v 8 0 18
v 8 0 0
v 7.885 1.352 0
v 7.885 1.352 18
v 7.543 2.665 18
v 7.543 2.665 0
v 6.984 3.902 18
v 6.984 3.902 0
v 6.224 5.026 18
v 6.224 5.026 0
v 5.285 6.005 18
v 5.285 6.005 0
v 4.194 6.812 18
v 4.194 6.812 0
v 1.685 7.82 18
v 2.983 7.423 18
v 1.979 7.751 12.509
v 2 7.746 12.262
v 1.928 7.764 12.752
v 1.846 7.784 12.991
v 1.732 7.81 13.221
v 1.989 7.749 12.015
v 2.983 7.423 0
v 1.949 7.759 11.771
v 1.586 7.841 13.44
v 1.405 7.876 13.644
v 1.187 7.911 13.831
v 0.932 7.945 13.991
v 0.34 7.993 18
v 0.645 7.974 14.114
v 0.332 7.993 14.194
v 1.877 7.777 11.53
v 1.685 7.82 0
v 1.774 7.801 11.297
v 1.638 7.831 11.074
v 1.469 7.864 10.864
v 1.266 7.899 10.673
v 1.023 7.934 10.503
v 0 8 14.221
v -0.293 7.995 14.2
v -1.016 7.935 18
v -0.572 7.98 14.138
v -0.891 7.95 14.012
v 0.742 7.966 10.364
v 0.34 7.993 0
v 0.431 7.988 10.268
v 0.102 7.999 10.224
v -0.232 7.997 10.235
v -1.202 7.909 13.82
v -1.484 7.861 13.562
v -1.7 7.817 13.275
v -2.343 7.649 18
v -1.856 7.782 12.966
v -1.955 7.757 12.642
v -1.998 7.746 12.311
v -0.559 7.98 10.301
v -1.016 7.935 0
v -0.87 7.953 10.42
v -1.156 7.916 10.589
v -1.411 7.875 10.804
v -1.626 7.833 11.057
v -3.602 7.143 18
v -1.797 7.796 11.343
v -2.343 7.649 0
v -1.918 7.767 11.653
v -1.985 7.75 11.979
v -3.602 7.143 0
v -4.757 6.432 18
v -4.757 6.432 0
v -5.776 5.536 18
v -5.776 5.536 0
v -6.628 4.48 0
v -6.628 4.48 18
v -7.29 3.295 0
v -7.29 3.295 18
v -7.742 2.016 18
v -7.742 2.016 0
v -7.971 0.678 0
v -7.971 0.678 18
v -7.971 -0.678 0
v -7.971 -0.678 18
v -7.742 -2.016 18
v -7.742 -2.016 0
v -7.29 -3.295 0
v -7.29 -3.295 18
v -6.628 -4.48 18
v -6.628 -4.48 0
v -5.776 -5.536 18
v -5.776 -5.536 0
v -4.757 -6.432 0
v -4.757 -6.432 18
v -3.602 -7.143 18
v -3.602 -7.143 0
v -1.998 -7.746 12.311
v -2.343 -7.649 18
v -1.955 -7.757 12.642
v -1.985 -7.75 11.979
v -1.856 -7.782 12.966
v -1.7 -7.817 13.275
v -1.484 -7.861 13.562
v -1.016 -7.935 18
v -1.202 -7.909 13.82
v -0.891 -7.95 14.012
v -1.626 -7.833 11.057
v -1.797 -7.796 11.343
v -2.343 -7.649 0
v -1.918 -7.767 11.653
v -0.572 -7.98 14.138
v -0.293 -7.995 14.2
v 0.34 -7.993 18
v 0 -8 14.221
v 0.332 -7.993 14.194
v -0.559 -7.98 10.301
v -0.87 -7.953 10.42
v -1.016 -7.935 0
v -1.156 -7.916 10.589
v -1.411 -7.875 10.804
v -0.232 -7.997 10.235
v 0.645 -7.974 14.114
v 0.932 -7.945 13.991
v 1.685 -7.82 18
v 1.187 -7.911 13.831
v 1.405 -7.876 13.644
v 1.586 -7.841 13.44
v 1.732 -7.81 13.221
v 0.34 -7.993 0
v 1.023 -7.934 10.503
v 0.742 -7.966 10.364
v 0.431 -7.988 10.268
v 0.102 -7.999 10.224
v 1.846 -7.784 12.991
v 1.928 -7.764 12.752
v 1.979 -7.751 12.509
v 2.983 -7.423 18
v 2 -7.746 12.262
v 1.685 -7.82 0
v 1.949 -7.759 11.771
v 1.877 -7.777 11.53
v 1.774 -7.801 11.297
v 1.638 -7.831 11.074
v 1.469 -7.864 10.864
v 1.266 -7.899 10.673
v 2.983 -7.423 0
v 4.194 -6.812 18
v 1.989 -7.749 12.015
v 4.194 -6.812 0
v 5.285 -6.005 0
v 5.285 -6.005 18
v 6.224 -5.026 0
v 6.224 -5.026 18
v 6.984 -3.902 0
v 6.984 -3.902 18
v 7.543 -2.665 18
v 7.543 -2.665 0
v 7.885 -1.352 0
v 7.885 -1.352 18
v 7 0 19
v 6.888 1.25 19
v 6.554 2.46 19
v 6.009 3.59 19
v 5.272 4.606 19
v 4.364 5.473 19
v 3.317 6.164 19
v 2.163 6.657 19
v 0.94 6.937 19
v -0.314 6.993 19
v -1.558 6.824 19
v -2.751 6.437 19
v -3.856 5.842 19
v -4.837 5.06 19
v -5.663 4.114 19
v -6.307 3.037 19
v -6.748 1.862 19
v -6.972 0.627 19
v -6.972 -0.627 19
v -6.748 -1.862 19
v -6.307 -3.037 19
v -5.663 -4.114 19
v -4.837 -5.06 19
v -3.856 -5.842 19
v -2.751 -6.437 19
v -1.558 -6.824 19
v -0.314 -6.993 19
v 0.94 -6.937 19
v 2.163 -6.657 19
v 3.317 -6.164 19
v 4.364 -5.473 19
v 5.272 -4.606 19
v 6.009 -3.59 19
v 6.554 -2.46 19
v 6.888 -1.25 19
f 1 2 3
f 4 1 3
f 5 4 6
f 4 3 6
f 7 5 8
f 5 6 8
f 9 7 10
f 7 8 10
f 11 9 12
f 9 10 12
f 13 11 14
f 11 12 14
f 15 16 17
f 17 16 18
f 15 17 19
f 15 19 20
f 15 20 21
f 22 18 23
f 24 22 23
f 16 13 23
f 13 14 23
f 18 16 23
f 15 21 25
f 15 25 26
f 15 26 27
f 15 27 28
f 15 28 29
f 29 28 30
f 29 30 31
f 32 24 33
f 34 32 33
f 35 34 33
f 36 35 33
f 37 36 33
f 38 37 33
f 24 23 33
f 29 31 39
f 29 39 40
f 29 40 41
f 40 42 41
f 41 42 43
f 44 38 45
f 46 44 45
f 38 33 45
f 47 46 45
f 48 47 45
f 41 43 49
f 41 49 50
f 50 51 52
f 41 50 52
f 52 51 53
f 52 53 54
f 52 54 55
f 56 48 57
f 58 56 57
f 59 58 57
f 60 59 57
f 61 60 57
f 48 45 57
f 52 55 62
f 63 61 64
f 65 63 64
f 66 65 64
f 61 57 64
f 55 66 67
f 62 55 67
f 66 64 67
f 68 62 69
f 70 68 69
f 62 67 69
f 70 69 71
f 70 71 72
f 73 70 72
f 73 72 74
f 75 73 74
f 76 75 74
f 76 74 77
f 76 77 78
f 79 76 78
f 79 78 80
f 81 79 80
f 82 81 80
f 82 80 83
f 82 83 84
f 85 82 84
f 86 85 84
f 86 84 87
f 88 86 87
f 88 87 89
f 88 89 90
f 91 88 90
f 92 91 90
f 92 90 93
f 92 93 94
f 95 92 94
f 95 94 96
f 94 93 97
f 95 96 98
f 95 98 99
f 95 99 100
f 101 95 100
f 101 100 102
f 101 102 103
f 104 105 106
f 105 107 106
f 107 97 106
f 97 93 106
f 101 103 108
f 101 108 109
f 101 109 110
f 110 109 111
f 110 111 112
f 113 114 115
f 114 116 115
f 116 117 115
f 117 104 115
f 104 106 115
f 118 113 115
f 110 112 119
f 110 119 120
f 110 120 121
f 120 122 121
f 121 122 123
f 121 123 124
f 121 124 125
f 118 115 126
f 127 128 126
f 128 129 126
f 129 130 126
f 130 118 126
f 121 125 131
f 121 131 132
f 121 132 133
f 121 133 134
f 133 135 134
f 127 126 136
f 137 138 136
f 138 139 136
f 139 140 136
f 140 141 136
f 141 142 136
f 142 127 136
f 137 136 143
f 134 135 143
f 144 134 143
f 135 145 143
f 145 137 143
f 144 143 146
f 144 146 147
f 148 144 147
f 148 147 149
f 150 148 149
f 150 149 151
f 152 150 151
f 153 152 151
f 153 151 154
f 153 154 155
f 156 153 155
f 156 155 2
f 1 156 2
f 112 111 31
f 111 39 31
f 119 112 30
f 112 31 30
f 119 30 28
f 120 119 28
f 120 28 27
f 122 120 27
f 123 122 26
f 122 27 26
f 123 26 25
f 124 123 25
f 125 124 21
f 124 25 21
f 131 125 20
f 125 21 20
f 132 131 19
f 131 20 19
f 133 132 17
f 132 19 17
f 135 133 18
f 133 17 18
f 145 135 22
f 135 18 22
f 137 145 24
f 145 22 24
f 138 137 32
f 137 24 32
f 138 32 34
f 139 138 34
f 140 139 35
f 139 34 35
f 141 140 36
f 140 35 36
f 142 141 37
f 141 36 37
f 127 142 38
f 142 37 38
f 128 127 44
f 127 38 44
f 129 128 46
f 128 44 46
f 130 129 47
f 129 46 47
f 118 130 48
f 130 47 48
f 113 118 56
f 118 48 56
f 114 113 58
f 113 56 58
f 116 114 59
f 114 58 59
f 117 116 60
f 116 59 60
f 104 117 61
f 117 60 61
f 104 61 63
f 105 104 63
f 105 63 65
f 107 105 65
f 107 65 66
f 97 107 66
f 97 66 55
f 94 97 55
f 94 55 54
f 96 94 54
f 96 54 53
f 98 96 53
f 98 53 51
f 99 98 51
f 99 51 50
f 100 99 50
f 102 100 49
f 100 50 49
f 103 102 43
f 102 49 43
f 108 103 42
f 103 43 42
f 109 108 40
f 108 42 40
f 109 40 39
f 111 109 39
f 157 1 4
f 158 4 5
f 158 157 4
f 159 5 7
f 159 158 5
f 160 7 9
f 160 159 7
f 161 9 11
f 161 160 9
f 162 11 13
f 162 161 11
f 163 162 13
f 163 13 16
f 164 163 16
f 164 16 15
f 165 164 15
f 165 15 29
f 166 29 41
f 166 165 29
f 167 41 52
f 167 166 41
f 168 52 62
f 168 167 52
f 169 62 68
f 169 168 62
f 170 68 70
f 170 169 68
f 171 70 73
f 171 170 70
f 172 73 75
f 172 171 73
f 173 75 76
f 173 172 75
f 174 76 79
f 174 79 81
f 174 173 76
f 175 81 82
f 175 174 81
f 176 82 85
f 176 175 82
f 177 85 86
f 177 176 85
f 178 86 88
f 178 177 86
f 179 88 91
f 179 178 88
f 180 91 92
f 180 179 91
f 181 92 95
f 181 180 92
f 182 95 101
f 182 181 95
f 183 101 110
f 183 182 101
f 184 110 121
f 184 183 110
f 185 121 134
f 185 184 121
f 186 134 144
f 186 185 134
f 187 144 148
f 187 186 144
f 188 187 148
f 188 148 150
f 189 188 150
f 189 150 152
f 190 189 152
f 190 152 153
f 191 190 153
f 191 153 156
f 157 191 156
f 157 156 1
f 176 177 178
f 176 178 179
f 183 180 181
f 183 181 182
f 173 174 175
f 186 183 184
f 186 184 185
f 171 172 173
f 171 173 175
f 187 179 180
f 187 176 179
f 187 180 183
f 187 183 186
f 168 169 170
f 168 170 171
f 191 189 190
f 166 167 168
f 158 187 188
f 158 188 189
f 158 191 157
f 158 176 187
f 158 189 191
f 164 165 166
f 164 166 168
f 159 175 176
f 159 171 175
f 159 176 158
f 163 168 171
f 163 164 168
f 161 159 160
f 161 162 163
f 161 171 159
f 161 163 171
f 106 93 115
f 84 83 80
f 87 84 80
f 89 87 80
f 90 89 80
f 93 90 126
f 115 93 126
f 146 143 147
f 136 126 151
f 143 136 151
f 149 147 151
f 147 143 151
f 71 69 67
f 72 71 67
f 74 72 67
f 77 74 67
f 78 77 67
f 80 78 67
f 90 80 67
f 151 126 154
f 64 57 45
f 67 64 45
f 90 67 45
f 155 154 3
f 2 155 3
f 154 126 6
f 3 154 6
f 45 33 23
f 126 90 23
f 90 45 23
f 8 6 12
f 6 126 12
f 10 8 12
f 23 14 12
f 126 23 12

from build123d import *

# Parameters (mm, degrees)
SKETCH1_R           = 8
BOSS_EXTRUDE1_DEPTH = 19
SKETCH2_R           = 2
CUT_EXTRUDE1_DEPTH  = 24
CHAMFER1_SIZE       = 1


with BuildPart() as part:
    # Sketch1 → Boss-Extrude1 (new body)
    with BuildSketch(Plane.XY):
        Circle(SKETCH1_R)
    extrude(amount=BOSS_EXTRUDE1_DEPTH)

    # Sketch2 → Cut-Extrude1 (cut, symmetric)
    with BuildSketch(Plane(origin=(0, 0, 0), x_dir=(1, 0, 0), z_dir=(0, 1, 0))):
        with Locations(Location((0, -12.221312154, 0), (0, 0, 270))):
            Circle(SKETCH2_R)
    extrude(amount=CUT_EXTRUDE1_DEPTH, both=True, mode=Mode.SUBTRACT)

    # Chamfer1
    chamfer1_edges = [part.edges().sort_by_distance(p)[0] for p in [
        (-8, 0, 19),
    ]]
    chamfer(chamfer1_edges, length=CHAMFER1_SIZE)


solid = part.part
